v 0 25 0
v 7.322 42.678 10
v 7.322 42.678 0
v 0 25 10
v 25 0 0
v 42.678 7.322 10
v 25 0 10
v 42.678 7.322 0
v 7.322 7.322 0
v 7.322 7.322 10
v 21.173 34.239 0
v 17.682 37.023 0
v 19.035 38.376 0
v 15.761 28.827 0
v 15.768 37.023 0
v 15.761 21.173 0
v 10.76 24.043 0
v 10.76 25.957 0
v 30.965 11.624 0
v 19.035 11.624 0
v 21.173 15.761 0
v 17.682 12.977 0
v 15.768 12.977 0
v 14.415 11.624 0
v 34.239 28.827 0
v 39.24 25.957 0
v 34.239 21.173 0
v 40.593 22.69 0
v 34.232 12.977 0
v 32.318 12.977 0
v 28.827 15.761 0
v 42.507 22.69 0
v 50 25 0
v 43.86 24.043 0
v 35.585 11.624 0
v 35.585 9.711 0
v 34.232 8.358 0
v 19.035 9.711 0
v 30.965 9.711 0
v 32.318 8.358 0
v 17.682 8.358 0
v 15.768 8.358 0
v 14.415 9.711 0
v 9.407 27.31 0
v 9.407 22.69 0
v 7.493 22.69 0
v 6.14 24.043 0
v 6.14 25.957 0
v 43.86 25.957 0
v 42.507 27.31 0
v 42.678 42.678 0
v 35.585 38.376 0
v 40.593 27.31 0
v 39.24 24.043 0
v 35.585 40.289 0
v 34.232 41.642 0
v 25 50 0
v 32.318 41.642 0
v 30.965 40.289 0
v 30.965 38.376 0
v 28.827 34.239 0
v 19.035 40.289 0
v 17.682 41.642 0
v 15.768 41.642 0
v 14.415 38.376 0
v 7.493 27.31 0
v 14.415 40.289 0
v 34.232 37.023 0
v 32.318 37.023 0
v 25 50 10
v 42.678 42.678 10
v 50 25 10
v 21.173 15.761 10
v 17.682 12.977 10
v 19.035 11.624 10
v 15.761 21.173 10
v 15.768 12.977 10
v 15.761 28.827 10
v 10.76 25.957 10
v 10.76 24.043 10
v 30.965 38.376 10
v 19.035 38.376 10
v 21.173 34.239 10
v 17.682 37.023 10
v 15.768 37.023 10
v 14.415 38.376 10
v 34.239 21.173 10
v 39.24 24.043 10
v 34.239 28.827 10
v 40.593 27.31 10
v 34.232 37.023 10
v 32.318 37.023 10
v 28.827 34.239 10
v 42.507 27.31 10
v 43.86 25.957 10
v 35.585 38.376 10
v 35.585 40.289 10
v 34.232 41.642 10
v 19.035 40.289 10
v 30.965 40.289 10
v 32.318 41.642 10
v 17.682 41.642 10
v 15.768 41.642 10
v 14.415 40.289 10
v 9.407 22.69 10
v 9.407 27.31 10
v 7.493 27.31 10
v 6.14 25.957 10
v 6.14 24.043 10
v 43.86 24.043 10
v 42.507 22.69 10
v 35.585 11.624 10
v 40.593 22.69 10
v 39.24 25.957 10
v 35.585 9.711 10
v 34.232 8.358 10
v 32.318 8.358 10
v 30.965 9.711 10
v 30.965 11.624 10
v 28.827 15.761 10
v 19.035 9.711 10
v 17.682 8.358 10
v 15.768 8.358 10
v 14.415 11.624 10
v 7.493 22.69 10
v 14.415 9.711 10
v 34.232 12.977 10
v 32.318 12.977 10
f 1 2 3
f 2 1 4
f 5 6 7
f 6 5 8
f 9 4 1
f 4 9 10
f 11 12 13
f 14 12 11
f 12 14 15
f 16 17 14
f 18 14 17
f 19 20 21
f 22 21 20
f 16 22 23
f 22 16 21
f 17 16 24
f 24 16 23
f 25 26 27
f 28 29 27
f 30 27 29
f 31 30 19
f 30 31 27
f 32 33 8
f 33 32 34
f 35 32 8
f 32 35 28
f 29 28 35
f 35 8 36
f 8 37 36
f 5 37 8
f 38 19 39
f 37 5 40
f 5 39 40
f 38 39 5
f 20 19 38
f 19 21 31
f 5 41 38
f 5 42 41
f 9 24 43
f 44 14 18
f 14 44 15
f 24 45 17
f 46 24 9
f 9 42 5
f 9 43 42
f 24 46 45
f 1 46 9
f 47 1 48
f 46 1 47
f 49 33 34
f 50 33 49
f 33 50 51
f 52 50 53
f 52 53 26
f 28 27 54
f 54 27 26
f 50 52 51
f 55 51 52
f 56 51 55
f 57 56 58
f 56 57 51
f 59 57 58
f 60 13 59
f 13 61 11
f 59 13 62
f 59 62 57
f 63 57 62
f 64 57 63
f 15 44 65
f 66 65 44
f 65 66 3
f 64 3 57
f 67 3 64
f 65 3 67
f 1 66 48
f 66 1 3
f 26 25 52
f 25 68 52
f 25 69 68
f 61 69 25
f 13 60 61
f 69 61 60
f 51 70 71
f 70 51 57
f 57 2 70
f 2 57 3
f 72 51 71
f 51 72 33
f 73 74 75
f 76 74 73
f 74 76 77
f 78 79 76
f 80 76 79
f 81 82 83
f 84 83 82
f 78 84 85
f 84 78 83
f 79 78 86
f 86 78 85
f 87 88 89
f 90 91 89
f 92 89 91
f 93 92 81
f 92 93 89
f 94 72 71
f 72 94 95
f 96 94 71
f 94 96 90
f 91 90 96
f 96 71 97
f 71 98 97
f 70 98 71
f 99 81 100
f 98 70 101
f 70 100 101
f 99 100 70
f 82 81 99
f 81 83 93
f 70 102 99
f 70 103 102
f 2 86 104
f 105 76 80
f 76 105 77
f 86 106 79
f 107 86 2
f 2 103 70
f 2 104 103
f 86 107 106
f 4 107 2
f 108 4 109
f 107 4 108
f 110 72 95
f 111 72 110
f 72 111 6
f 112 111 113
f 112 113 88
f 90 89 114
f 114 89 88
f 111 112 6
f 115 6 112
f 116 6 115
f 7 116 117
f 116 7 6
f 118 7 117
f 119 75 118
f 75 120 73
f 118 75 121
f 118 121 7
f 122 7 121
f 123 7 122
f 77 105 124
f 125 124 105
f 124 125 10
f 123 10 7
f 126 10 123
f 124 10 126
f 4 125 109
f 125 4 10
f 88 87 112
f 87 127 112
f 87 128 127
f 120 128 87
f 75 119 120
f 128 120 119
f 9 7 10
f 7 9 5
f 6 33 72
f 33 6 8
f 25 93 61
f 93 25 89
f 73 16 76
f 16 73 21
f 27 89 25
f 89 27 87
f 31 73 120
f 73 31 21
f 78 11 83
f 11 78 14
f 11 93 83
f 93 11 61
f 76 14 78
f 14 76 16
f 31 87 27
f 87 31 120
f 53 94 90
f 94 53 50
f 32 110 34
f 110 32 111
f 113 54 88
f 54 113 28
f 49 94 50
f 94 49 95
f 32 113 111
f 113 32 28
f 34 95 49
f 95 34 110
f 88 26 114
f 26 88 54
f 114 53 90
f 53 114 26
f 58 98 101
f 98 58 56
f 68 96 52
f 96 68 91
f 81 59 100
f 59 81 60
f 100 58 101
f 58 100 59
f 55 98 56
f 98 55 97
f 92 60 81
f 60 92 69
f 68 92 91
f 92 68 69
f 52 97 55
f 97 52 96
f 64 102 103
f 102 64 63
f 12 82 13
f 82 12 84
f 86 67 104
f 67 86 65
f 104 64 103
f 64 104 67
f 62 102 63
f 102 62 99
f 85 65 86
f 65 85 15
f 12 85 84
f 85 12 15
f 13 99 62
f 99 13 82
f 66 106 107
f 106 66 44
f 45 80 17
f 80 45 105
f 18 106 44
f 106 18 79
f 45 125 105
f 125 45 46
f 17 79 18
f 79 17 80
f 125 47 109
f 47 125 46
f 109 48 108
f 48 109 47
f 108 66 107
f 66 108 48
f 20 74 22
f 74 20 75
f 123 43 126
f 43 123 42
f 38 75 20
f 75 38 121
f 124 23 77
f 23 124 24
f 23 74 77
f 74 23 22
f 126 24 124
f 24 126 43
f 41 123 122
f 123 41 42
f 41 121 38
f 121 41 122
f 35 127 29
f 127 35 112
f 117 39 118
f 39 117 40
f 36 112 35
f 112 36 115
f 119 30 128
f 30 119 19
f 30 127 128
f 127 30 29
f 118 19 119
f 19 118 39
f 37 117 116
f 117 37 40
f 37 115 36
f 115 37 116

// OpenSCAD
$fn = 32;

// ----------------------------------------------------------------------
// Polygon plate: 8-gon R25, 6 bolt windows
// ----------------------------------------------------------------------

// --- parameters (mm) ---
sides = 8;                // number of polygon sides
plate_r = 25;             // circumscribed radius of the polygon
bore_r = 10;              // centre bore radius
bolts = 6;                // number of bolt windows
ring_r = 16.55;           // bolt-circle radius
bolt_r = 2.5;             // bolt window radius
plate_t = 10;             // plate thickness, Z (extrusion height)

plate_d = 2 * plate_r;  // circumscribed diameter
bore_d = 2 * bore_r;  // centre bore diameter
bolt_d = 2 * bolt_r;  // bolt window diameter
ring_d = 2 * ring_r;  // bolt-circle diameter

profile = [[50, 25], [42.678, 42.678], [25, 50], [7.322, 42.678], [0, 25], [7.322, 7.322], [25, 0], [42.678, 7.322]];  // primary outline, 8 points, counter clockwise
void_1 = [[34.239, 28.827], [28.827, 34.239], [21.173, 34.239], [15.761, 28.827], [15.761, 21.173], [21.173, 15.761], [28.827, 15.761], [34.239, 21.173]];  // centre bore, 8 points
void_2 = [[43.86, 25.957], [42.507, 27.31], [40.593, 27.31], [39.24, 25.957], [39.24, 24.043], [40.593, 22.69], [42.507, 22.69], [43.86, 24.043]];  // bolt window 1, 8 points
void_3 = [[35.585, 40.289], [34.232, 41.642], [32.318, 41.642], [30.965, 40.289], [30.965, 38.376], [32.318, 37.023], [34.232, 37.023], [35.585, 38.376]];  // bolt window 2, 8 points
void_4 = [[19.035, 40.289], [17.682, 41.642], [15.768, 41.642], [14.415, 40.289], [14.415, 38.376], [15.768, 37.023], [17.682, 37.023], [19.035, 38.376]];  // bolt window 3, 8 points
void_5 = [[10.76, 25.957], [9.407, 27.31], [7.493, 27.31], [6.14, 25.957], [6.14, 24.043], [7.493, 22.69], [9.407, 22.69], [10.76, 24.043]];  // bolt window 4, 8 points
void_6 = [[19.035, 11.624], [17.682, 12.977], [15.768, 12.977], [14.415, 11.624], [14.415, 9.711], [15.768, 8.358], [17.682, 8.358], [19.035, 9.711]];  // bolt window 5, 8 points
void_7 = [[35.585, 11.624], [34.232, 12.977], [32.318, 12.977], [30.965, 11.624], [30.965, 9.711], [32.318, 8.358], [34.232, 8.358], [35.585, 9.711]];  // bolt window 6, 8 points

// --- the one profile operation ---
difference() {
  linear_extrude(height = plate_t) polygon(points = profile);
  translate([0, 0, -1])
    linear_extrude(height = plate_t + 2) polygon(points = void_1);
  translate([0, 0, -1])
    linear_extrude(height = plate_t + 2) polygon(points = void_2);
  translate([0, 0, -1])
    linear_extrude(height = plate_t + 2) polygon(points = void_3);
  translate([0, 0, -1])
    linear_extrude(height = plate_t + 2) polygon(points = void_4);
  translate([0, 0, -1])
    linear_extrude(height = plate_t + 2) polygon(points = void_5);
  translate([0, 0, -1])
    linear_extrude(height = plate_t + 2) polygon(points = void_6);
  translate([0, 0, -1])
    linear_extrude(height = plate_t + 2) polygon(points = void_7);
}
